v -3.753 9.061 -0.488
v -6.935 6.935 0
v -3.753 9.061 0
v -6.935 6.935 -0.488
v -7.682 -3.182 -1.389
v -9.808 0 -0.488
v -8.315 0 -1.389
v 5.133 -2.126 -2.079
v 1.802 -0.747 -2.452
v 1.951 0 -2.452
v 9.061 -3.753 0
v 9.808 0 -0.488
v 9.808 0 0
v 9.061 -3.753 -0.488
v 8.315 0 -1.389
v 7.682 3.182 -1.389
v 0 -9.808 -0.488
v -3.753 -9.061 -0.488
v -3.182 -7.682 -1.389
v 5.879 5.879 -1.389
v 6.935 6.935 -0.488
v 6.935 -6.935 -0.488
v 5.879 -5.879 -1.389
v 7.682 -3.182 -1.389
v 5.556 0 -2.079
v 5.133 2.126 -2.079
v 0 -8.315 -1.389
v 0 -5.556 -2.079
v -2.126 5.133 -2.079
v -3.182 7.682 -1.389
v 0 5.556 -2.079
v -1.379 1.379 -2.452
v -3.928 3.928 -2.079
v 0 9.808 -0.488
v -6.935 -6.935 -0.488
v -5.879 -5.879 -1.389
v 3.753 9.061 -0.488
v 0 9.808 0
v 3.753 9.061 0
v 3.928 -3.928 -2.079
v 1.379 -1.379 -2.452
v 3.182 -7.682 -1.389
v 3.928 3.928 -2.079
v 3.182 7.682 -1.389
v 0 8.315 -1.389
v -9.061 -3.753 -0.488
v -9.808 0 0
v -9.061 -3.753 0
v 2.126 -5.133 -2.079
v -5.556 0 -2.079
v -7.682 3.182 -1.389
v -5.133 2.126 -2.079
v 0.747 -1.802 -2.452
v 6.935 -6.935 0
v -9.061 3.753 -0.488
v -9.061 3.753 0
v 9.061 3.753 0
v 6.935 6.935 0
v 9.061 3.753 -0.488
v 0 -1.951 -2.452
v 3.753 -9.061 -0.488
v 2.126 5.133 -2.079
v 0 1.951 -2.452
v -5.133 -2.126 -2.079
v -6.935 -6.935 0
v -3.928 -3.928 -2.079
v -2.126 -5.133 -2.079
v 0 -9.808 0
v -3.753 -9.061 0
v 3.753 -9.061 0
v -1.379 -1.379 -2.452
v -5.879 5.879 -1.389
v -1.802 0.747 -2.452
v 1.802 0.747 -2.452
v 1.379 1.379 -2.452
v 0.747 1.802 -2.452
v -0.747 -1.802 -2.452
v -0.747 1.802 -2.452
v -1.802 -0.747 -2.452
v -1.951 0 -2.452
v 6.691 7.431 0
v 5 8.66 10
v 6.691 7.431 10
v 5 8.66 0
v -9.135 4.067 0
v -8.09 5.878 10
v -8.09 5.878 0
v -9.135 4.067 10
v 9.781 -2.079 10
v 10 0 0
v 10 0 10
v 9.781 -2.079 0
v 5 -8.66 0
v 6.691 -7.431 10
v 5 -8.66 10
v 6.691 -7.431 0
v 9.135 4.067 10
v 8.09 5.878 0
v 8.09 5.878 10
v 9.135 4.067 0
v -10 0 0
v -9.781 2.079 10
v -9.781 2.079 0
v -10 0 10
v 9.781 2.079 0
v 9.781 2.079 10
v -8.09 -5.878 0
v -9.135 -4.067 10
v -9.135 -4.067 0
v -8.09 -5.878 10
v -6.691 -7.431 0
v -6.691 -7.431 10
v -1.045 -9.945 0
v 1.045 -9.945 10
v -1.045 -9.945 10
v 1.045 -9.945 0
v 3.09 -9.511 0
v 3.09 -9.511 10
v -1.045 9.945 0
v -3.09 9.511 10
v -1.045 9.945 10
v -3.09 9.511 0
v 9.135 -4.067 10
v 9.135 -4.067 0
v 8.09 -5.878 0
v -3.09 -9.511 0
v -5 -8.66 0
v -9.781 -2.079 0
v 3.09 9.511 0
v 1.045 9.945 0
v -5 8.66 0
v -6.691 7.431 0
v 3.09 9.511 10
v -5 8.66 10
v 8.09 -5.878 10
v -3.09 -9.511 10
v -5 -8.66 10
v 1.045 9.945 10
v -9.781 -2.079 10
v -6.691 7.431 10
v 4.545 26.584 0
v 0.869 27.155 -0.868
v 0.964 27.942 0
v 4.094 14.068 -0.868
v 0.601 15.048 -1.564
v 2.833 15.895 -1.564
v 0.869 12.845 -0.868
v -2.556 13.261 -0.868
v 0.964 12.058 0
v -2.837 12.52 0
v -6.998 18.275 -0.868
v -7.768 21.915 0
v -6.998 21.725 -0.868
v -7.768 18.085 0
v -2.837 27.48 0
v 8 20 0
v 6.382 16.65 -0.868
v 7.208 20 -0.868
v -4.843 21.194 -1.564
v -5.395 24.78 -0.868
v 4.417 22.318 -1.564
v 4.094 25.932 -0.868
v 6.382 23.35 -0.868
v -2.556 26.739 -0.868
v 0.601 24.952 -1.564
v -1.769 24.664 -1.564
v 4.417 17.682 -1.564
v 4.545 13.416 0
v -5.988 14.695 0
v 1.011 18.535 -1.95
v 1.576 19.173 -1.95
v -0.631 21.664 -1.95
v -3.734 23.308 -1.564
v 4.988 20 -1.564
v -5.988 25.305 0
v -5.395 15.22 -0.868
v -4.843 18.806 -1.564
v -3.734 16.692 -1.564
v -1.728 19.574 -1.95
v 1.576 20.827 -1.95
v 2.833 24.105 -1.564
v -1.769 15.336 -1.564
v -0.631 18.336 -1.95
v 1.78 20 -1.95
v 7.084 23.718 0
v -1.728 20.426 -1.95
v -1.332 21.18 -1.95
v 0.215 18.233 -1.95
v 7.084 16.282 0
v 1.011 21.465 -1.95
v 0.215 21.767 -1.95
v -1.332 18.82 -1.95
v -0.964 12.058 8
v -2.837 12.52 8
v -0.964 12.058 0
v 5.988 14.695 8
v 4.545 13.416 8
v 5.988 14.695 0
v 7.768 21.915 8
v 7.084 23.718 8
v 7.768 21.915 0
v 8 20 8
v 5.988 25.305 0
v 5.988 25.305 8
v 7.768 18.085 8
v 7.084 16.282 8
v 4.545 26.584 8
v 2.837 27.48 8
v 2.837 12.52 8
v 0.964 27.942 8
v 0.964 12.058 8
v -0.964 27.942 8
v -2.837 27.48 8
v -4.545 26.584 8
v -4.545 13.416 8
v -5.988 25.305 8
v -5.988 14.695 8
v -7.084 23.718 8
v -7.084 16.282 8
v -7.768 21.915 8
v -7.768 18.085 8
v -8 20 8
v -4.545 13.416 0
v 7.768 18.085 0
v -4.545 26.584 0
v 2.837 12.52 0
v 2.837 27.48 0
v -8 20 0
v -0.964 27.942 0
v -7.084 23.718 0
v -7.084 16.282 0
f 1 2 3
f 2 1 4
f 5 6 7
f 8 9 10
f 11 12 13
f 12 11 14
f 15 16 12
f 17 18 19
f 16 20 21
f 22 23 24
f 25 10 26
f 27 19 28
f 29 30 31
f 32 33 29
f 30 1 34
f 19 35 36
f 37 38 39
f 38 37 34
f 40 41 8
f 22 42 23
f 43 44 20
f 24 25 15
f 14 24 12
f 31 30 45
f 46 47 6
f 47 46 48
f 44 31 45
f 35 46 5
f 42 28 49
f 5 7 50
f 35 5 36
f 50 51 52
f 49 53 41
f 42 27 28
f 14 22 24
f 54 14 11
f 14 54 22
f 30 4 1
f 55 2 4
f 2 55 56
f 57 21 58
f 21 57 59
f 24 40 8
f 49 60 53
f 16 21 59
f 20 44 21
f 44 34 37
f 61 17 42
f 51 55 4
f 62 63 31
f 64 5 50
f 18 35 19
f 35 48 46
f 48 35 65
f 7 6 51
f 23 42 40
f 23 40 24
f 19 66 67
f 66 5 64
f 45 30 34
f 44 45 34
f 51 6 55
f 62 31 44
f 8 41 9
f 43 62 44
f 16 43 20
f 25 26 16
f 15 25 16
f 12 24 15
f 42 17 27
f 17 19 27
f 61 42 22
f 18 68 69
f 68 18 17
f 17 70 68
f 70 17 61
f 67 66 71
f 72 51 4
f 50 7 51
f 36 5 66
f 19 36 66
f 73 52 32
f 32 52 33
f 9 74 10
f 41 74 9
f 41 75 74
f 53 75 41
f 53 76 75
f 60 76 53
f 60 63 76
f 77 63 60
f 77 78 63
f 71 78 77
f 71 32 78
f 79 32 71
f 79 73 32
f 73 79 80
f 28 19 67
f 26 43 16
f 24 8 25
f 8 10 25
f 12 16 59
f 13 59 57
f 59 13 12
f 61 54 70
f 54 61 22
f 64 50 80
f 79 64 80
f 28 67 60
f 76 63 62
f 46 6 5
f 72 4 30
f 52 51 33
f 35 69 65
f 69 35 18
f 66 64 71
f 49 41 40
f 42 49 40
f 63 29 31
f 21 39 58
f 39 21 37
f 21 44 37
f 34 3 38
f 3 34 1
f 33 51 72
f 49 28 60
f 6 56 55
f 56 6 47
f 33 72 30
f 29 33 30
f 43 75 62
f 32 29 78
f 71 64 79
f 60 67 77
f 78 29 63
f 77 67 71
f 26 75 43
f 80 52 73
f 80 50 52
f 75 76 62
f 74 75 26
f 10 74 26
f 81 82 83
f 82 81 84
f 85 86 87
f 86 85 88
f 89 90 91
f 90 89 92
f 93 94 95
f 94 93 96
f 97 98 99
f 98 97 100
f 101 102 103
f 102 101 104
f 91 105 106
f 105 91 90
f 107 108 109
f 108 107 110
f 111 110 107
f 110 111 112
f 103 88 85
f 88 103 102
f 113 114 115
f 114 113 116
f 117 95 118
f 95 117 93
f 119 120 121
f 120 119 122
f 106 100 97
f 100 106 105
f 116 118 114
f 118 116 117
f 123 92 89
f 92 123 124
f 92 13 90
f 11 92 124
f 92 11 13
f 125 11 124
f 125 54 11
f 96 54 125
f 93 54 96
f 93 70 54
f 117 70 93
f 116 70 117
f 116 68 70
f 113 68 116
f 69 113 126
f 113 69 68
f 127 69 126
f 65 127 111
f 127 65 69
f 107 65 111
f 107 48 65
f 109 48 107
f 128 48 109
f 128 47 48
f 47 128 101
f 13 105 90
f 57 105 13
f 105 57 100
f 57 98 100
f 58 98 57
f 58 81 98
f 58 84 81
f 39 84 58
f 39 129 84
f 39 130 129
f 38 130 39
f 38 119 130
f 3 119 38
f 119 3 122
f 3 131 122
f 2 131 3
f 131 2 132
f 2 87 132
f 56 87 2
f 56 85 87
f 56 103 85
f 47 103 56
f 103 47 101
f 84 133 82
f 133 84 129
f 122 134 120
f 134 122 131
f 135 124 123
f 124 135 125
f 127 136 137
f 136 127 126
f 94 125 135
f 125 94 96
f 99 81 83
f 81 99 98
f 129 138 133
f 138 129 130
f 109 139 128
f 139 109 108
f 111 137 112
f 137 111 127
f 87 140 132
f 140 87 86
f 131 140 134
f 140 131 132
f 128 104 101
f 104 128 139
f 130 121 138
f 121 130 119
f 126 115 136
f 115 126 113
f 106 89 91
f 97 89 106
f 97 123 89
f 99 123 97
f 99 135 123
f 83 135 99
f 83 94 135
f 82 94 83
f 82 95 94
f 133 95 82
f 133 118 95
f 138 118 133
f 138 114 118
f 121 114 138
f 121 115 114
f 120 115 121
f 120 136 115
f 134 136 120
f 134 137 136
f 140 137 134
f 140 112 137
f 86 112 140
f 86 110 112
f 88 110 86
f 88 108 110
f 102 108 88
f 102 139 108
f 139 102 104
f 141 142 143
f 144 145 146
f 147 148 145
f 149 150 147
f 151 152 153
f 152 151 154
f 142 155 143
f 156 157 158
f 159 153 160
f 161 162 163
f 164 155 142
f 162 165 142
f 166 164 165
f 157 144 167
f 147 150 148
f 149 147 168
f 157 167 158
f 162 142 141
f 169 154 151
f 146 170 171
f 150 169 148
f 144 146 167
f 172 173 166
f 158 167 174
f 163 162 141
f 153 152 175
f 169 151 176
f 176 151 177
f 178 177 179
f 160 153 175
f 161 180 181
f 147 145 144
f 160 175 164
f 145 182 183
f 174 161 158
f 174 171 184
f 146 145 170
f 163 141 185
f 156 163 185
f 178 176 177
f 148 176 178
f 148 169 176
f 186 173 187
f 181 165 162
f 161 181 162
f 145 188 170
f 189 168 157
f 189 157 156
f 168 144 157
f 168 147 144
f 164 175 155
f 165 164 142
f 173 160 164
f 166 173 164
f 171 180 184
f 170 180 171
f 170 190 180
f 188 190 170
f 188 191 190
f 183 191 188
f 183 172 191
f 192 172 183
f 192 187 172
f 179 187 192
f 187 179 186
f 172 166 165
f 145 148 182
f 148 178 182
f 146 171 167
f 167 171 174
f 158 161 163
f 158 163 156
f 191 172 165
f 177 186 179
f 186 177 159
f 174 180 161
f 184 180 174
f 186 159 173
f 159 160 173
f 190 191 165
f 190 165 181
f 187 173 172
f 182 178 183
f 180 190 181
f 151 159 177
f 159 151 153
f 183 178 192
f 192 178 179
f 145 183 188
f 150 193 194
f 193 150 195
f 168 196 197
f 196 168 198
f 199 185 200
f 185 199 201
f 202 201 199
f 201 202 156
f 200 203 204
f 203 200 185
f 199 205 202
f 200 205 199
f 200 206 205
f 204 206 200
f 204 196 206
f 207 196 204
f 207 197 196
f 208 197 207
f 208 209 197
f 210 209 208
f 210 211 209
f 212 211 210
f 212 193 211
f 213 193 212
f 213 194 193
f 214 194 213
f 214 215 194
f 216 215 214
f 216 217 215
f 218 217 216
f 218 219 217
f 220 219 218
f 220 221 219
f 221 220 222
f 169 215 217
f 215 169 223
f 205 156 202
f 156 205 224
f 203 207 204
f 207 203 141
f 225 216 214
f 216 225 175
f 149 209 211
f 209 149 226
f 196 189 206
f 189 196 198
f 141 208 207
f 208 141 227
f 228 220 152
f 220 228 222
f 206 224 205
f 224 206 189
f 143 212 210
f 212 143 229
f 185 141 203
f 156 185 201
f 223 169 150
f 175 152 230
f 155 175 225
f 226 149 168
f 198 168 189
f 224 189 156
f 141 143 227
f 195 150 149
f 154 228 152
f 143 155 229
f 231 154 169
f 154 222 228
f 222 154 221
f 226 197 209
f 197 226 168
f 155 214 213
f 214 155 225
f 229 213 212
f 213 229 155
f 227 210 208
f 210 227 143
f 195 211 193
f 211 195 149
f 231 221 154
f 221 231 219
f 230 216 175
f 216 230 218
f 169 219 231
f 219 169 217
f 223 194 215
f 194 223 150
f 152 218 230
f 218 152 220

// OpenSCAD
pot_height = 10;
wall_thickness =1;
outer_rad =5;
inner_rad = 4;
base_scale_factor = 2;
height_scale_factor = 0.5;
union () {
scale ([base_scale_factor,base_scale_factor,height_scale_factor])
  color ("red")
  sphere (outer_rad);
    color("blue")
  cylinder (h=pot_height,r=2*outer_rad,2*outer_rad);
}
translate([0,20,0])
union () {
scale ([base_scale_factor,base_scale_factor,height_scale_factor])
  sphere (r = inner_rad);
cylinder (h=pot_height+2,r =2*inner_rad, 2*inner_rad);
}
